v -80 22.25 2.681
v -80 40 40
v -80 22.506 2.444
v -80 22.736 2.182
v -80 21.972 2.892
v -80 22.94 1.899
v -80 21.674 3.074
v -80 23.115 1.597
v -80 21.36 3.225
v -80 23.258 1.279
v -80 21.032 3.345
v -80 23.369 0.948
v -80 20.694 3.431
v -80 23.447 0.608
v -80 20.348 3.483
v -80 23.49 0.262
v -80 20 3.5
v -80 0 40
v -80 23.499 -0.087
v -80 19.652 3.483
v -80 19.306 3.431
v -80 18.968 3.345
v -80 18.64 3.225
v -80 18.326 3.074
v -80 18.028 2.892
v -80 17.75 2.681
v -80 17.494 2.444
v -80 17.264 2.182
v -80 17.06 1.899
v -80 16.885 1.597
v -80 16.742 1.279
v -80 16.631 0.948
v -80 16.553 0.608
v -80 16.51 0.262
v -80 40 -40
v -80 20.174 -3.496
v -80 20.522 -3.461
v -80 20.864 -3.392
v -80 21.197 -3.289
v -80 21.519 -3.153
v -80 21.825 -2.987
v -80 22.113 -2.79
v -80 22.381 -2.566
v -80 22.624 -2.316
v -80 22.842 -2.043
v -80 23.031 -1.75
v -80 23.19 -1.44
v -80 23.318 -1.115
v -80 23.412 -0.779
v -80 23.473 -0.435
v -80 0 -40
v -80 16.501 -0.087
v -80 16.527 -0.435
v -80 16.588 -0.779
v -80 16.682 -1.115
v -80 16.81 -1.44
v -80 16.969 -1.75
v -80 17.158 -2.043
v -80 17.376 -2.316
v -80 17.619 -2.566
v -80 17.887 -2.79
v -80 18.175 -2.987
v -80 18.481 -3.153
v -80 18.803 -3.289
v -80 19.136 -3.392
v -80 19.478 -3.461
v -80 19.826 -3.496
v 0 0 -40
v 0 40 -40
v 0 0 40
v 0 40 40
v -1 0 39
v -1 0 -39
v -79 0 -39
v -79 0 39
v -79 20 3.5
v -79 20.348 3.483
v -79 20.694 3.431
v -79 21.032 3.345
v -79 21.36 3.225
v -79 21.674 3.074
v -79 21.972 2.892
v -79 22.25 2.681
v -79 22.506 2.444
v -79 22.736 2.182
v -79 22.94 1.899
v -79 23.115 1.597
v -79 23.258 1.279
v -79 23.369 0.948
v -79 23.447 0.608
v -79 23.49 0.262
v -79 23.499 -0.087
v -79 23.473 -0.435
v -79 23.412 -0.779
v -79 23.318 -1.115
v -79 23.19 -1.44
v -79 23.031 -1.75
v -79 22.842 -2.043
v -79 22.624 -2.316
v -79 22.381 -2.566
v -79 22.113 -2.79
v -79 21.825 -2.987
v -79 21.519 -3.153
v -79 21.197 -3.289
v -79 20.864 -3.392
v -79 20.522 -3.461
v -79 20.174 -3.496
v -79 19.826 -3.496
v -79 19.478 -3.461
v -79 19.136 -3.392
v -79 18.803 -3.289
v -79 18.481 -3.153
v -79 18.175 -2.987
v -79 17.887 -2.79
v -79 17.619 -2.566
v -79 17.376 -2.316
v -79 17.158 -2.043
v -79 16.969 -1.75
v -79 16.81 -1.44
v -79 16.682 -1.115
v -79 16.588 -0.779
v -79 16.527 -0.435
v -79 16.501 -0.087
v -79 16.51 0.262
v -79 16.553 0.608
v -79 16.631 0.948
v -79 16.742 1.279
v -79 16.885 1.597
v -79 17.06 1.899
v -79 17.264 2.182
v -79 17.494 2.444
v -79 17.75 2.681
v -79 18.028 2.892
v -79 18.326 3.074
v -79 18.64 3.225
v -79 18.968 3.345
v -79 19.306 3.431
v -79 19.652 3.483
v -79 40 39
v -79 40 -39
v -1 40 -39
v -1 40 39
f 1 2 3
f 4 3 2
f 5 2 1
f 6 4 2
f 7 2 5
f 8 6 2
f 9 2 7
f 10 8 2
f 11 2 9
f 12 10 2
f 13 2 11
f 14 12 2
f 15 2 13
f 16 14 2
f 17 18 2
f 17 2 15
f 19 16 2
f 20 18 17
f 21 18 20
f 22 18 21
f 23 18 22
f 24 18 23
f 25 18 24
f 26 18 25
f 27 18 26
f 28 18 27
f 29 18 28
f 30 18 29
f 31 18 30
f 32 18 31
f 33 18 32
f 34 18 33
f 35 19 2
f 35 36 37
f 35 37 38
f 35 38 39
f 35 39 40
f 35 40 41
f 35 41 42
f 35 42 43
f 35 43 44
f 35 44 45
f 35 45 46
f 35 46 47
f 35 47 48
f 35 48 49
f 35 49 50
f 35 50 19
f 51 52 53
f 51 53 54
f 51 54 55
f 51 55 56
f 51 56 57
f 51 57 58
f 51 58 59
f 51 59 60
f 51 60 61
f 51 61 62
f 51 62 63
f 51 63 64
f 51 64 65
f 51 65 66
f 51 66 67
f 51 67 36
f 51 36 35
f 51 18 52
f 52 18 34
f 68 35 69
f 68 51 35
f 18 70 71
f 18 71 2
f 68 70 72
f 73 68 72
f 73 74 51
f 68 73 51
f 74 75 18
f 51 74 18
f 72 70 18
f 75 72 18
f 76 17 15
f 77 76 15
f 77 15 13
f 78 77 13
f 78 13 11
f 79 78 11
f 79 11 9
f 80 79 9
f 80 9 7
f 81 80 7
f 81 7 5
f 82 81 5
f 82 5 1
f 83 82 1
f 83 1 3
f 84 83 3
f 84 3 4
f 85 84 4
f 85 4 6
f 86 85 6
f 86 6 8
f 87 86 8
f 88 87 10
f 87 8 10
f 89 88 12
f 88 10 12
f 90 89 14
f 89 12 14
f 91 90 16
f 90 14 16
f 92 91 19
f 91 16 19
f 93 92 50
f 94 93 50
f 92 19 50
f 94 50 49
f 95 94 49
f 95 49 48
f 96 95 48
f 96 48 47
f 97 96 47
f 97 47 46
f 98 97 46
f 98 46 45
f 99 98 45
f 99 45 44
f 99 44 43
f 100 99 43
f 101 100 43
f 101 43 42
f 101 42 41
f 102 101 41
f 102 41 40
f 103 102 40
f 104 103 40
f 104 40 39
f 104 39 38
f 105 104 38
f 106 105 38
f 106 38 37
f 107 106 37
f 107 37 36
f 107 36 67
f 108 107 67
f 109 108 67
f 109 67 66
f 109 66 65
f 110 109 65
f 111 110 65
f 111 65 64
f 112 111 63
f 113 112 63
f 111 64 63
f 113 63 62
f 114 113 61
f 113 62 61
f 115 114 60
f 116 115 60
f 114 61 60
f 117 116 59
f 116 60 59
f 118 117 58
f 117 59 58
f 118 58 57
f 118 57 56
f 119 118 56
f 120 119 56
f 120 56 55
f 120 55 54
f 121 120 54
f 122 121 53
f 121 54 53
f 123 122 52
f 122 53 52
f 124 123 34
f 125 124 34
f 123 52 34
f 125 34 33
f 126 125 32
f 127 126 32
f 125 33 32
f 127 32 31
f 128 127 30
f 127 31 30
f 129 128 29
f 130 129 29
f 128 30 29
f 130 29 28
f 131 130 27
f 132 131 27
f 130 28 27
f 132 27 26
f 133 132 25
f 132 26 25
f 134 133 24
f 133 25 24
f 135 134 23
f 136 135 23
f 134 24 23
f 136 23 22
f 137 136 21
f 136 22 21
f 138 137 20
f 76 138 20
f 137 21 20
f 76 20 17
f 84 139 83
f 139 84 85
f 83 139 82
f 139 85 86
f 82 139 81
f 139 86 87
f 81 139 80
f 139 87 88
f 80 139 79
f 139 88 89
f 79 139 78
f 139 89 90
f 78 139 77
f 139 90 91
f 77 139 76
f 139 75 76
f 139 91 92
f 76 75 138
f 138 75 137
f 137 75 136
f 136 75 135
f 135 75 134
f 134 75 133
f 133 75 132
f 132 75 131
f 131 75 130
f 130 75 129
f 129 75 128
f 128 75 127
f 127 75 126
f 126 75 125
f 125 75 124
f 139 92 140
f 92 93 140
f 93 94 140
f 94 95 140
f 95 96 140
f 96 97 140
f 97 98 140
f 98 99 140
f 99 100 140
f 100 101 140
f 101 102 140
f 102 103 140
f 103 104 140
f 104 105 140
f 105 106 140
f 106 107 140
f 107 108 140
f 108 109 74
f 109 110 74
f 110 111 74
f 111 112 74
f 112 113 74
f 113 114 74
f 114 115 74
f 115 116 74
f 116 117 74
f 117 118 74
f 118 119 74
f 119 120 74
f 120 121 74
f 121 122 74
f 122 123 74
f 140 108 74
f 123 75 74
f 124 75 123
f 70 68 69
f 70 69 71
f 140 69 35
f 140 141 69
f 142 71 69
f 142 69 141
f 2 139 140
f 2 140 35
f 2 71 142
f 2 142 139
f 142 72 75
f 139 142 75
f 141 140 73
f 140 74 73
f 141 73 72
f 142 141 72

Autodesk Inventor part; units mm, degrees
ref_plane "YZ Plane" through (0, 0, 0) normal (1, 0, 0) x (0, 1, 0)
ref_plane "XZ Plane" through (0, 0, 0) normal (0, 1, 0) x (-1, 0, 0)
ref_plane "XY Plane" through (0, 0, 0) normal (0, 0, 1) x (1, 0, 0)
sketch "Sketch12" plane through (0, 0, 0) normal (0, 1, 0) x (-1, 0, 0)
  line L0 (0, 0) -> (0, 40)
  line L1 (0, 40) -> (80, 40)
  line L2 (80, 40) -> (80, 0)
  line L3 (80, 0) -> (80, -40)
  line L4 (80, -40) -> (0, -40)
  line L5 (0, -40) -> (0, 0)
  dimension "d39" = 40
  dimension "d40" = 80
  dimension "d41" = 40
extrude "Extrusion10" add sketch "Sketch12" along normal blind 40
shell "Shell2" thickness 1 removed faces 2 at (-26.6667, 0, -13.3333) at (-26.6667, 40, -13.3333)
sketch "Sketch13" plane through (-80, 0, -40) normal (-1, 0, 0) x (0, 0, 1)
  line L0 (0, 0) -> (80, 0) projected
  line L1 (80, 40) -> (0, 40) projected
  circle A0 centre (40, 20) radius 3.5
  point P0 (40, 0)
  dimension "d45" = 7
extrude "Extrusion11" cut sketch "Sketch13" against normal blind 1
properties part number "MAN_BASIS_PRIMARY_STRUCTURE" material "ABS Plastic"
